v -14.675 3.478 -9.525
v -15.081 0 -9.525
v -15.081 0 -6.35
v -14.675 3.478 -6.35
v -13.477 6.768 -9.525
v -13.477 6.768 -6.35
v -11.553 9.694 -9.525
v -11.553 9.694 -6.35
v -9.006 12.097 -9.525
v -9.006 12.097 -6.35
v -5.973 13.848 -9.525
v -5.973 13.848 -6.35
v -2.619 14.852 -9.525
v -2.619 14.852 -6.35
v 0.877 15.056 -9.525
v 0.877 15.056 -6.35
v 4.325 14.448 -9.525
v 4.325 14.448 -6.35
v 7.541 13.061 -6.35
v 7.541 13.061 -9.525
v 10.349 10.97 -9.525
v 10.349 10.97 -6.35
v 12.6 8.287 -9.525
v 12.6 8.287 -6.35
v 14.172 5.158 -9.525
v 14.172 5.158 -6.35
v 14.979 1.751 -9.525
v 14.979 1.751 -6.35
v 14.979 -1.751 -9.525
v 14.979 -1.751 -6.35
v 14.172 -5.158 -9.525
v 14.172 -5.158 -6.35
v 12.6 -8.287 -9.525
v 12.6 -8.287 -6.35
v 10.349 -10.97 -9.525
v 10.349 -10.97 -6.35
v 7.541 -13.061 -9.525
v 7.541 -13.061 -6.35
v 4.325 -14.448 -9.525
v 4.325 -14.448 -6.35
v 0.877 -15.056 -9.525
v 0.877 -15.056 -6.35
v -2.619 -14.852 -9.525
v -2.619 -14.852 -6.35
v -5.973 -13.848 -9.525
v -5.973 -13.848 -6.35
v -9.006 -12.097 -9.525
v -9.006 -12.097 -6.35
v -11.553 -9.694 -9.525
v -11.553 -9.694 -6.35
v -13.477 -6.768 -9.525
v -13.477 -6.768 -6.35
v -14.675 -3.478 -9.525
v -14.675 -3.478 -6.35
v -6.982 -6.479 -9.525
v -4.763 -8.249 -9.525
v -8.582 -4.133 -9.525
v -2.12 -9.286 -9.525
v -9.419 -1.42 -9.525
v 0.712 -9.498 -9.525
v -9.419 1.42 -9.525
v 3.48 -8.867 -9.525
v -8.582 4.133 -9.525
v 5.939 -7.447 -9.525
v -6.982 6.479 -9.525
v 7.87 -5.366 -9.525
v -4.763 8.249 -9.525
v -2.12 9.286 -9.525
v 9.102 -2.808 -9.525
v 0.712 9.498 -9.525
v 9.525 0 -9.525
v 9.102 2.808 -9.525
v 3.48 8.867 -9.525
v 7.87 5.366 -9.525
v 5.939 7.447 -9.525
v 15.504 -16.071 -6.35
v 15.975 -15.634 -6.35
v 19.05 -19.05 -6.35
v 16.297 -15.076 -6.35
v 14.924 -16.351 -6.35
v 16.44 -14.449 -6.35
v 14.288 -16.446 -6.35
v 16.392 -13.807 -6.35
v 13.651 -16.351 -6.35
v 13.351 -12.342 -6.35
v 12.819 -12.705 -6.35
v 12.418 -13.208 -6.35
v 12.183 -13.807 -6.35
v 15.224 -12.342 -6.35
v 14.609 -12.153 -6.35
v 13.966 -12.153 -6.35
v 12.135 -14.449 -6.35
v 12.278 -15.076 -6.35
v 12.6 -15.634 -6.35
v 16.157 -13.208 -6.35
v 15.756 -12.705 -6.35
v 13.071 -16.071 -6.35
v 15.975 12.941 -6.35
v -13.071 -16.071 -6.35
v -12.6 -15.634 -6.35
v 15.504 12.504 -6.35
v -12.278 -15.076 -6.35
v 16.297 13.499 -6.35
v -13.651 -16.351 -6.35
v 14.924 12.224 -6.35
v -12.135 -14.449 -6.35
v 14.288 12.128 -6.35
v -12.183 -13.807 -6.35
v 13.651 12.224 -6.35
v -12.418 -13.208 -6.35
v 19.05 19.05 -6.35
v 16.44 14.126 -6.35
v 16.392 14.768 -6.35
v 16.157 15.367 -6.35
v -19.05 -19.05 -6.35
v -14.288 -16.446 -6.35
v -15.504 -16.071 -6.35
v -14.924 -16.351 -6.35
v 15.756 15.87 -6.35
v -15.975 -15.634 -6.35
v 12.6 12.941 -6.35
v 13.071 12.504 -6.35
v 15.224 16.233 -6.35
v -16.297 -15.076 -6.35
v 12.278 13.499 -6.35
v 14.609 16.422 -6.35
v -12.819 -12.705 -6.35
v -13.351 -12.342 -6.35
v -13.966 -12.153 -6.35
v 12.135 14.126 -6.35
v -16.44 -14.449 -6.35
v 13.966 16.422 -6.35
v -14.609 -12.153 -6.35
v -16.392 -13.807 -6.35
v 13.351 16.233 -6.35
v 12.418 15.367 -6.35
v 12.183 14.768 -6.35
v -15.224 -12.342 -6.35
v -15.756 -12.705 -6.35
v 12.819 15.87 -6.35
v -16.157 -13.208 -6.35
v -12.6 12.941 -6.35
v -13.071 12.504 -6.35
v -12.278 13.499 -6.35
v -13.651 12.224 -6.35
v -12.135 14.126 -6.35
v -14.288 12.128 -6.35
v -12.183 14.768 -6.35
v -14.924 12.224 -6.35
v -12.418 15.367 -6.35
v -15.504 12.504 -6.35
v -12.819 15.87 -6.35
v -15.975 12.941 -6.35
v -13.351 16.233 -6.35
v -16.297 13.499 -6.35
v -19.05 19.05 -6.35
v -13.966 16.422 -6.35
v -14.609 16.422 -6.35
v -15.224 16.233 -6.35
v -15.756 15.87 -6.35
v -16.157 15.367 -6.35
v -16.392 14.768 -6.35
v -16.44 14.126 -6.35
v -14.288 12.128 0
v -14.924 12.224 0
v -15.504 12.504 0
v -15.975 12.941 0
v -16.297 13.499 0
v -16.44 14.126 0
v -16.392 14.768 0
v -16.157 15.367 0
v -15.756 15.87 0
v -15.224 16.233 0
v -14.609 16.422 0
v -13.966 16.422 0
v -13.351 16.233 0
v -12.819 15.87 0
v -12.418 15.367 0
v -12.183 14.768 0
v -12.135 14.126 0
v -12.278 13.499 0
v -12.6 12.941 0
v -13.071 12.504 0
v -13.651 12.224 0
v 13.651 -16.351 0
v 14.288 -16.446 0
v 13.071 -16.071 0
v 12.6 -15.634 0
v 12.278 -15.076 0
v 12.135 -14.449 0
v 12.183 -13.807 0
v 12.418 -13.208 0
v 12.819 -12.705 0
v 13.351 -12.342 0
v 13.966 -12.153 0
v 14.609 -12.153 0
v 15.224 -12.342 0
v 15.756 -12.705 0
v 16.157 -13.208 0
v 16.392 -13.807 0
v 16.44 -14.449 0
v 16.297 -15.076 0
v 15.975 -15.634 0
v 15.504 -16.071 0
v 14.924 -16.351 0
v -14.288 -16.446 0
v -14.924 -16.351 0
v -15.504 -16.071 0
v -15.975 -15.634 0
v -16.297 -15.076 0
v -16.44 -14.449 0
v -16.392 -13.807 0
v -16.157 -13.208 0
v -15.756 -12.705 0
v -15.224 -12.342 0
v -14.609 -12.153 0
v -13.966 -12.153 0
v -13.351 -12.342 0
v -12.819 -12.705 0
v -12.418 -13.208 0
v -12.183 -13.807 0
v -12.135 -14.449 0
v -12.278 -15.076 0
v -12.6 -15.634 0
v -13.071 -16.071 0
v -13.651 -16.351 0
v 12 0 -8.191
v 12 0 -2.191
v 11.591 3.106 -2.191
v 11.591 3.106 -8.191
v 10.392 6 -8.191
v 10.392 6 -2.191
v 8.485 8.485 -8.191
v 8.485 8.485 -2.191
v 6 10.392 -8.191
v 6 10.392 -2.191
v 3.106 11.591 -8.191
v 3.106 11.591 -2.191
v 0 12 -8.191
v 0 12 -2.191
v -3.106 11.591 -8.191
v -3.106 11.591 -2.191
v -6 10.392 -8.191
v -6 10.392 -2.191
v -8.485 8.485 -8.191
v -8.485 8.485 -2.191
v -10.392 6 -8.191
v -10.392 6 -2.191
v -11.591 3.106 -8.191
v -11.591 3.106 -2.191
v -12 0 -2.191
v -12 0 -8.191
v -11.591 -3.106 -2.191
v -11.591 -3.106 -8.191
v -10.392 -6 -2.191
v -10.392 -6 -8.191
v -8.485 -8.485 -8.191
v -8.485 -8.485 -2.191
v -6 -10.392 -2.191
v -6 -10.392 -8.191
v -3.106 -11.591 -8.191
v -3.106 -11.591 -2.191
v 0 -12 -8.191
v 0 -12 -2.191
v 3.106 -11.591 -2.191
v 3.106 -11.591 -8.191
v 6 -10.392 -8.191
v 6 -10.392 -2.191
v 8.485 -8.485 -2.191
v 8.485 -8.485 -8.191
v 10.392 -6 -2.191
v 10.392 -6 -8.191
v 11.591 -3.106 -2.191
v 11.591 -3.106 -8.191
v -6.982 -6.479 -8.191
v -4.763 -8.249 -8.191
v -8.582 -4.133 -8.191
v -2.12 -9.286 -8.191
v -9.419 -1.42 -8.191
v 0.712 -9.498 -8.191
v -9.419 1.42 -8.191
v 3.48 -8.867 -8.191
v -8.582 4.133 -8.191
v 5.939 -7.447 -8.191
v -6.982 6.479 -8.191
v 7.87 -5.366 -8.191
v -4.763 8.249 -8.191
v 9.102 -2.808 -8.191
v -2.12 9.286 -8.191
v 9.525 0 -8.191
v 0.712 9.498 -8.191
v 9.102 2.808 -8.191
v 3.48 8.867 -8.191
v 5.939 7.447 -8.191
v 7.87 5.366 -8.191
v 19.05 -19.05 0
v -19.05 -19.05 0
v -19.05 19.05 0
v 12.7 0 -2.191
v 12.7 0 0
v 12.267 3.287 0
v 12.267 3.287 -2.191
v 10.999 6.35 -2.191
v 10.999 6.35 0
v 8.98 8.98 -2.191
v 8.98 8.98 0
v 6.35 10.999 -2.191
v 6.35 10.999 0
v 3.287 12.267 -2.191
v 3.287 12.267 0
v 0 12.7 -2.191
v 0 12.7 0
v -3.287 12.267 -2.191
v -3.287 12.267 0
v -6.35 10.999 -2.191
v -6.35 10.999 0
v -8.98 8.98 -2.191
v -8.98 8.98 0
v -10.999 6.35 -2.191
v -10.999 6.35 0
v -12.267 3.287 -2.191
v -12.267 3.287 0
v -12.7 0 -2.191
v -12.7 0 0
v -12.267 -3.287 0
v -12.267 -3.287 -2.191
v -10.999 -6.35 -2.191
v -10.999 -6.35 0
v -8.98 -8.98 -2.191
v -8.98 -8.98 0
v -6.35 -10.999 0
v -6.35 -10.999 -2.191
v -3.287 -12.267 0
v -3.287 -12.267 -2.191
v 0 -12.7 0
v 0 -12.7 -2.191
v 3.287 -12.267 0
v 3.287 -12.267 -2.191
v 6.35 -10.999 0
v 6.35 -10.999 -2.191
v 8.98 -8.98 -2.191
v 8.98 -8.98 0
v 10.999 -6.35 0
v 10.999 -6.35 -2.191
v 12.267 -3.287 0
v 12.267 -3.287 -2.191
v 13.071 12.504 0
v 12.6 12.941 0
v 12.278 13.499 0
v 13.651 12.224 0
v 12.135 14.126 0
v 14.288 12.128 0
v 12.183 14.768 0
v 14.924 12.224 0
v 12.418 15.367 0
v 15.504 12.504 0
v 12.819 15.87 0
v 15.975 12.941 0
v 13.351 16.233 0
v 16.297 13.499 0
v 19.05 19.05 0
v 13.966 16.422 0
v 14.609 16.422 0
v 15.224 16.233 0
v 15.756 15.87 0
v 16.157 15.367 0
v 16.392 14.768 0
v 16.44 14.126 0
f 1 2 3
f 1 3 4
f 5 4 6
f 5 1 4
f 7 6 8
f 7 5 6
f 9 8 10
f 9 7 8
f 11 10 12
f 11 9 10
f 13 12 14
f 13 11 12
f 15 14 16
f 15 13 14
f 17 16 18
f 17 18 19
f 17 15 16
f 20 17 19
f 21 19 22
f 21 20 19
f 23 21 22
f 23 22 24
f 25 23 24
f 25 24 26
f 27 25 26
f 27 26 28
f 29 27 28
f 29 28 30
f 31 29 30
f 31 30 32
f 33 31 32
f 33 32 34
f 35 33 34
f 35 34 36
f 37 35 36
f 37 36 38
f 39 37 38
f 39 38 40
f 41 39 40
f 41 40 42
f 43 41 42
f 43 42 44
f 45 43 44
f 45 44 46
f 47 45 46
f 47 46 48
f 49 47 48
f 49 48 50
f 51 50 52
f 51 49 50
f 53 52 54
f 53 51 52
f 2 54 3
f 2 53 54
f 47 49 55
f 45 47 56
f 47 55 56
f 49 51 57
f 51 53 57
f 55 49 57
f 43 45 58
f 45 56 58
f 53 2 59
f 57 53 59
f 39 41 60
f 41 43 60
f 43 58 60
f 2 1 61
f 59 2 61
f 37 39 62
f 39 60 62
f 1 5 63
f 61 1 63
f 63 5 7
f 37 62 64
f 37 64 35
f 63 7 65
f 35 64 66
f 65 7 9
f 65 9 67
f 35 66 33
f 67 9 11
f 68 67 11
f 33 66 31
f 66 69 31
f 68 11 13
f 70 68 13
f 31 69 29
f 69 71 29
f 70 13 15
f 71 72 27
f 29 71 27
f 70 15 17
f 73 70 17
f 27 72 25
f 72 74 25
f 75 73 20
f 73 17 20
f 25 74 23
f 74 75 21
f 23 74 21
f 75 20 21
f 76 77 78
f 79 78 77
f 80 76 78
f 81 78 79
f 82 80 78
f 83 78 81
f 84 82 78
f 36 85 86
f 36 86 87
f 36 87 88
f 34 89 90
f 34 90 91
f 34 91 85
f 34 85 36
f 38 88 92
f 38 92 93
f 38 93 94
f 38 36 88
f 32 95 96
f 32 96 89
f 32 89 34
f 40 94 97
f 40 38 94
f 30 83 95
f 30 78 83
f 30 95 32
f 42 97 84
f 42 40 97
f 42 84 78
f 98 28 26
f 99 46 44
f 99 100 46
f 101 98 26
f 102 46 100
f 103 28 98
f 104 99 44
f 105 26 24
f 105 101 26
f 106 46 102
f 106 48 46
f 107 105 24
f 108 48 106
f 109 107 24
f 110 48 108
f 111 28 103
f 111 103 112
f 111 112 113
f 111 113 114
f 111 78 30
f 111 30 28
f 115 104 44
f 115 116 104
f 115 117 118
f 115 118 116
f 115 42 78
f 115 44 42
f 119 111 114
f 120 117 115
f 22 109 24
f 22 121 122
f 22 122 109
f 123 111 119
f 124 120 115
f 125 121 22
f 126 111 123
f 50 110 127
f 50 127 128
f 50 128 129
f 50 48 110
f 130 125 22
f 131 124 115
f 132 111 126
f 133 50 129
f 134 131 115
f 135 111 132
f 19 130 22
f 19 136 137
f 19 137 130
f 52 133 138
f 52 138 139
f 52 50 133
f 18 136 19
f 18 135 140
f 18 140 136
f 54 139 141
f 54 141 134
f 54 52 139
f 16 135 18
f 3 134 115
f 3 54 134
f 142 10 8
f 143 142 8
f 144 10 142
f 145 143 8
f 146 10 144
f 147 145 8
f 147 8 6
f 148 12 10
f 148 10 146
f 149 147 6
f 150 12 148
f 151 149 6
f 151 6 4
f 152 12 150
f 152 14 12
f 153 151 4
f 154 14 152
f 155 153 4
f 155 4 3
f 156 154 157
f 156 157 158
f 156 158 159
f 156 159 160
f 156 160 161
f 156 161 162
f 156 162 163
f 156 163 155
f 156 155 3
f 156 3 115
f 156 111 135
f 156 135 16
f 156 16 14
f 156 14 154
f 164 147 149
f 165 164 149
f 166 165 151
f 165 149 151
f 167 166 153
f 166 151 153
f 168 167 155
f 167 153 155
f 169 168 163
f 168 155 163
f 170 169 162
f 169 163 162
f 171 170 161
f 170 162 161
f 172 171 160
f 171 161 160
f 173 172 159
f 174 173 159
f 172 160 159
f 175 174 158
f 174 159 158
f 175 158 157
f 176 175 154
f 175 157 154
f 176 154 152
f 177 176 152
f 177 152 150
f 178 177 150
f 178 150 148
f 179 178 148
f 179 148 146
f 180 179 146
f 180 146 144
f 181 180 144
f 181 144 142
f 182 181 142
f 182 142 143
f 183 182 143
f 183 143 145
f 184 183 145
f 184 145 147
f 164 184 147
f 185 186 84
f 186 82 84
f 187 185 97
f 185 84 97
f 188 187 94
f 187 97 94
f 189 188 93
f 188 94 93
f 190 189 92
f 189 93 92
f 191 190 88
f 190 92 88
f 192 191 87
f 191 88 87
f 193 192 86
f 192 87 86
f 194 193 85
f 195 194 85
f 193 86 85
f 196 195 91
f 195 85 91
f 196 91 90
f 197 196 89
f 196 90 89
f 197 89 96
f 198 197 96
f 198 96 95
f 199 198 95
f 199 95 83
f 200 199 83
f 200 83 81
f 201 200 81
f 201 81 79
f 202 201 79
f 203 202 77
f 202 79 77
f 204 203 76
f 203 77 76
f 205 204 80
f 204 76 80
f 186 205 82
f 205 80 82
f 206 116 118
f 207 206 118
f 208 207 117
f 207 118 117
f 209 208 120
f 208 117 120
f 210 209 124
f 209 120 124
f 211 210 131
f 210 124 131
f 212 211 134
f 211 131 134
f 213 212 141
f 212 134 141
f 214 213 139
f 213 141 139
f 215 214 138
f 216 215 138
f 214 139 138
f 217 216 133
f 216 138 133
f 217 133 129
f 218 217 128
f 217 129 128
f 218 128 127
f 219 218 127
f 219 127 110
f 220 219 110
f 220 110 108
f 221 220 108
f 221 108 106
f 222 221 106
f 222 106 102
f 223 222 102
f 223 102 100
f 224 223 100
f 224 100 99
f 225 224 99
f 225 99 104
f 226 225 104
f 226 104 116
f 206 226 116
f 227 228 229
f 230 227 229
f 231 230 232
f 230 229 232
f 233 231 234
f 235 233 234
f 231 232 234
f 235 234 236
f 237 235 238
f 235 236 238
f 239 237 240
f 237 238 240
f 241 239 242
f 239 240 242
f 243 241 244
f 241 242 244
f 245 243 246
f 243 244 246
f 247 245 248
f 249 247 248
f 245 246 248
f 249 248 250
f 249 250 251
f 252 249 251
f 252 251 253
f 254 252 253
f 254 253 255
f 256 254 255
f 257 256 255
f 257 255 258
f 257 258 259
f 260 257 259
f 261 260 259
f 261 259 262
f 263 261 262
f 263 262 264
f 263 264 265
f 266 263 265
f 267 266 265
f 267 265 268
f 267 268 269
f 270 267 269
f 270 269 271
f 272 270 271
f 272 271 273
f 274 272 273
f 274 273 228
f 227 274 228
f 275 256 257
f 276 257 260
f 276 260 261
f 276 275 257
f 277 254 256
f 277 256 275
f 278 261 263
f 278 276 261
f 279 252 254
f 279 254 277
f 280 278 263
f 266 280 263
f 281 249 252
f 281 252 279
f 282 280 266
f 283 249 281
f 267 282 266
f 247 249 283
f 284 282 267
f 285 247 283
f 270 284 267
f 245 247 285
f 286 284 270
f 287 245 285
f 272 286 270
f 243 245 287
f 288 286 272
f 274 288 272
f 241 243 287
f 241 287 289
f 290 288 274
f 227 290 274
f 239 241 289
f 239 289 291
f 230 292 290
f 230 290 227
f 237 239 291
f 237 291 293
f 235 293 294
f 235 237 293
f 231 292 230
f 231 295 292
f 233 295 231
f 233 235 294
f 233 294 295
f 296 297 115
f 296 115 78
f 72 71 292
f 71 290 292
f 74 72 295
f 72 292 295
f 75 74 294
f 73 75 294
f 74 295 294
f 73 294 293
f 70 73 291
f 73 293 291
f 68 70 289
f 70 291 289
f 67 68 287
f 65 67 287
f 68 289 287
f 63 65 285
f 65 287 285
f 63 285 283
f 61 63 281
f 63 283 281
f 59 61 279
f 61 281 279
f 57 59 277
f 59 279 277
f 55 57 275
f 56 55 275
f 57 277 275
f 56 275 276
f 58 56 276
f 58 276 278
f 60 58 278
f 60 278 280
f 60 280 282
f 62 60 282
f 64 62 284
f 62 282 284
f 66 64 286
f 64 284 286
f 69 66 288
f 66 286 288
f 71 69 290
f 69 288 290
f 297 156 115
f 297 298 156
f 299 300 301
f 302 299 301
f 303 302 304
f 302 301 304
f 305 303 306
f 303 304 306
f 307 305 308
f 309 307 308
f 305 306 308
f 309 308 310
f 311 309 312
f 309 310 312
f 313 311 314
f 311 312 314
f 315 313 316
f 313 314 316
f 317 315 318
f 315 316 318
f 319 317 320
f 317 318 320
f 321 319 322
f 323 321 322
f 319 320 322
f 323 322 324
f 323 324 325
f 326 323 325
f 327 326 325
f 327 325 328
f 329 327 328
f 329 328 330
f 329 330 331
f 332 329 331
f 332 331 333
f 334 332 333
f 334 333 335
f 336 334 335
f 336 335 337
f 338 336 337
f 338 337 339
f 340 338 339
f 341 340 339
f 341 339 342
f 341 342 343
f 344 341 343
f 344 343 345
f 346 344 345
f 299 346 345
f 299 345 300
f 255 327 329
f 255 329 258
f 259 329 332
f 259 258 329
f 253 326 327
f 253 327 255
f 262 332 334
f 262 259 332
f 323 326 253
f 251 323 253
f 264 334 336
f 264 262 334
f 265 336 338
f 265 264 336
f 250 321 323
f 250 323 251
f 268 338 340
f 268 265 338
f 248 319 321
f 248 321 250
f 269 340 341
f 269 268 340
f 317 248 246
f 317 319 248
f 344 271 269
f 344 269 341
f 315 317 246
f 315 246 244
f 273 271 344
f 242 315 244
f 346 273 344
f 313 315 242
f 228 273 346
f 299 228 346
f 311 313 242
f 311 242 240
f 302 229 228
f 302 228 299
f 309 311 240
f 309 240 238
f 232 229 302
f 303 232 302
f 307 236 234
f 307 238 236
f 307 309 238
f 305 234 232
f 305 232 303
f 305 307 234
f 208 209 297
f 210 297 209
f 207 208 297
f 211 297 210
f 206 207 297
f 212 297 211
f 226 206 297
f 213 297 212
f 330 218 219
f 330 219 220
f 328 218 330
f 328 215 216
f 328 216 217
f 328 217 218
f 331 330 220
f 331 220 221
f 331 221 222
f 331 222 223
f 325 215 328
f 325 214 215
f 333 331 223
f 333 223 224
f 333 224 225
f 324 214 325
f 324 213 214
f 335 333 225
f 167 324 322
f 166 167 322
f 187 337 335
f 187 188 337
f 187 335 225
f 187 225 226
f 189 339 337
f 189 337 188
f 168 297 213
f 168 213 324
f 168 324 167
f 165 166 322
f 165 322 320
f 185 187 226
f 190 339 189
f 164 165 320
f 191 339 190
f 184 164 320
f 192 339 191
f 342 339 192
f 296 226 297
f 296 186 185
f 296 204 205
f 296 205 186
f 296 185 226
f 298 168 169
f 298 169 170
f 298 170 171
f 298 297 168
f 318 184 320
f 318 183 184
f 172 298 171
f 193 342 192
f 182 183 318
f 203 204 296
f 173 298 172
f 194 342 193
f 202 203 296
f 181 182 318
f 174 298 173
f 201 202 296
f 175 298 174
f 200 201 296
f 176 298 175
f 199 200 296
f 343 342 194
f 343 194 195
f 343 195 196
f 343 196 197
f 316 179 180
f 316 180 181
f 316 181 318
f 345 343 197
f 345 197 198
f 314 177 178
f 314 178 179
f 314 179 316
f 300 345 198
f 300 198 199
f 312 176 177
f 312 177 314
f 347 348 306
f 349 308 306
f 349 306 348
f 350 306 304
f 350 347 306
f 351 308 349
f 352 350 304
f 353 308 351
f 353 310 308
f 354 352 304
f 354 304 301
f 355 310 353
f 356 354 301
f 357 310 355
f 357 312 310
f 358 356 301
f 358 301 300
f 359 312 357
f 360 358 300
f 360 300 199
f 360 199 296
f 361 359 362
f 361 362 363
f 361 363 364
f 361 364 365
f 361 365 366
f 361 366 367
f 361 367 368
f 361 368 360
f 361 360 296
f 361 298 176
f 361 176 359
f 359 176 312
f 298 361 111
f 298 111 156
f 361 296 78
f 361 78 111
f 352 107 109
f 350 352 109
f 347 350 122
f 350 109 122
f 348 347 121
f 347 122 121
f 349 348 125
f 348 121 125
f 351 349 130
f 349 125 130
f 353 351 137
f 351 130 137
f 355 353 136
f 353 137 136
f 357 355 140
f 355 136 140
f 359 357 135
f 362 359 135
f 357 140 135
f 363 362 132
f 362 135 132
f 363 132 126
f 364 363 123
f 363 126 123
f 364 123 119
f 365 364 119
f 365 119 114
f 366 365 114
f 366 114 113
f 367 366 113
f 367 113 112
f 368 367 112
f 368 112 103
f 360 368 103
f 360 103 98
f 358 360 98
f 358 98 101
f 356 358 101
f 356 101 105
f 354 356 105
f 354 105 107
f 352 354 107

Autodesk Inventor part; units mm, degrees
ref_plane "YZ Plane" through (0, 0, 0) normal (1, 0, 0) x (0, 1, 0)
ref_plane "XZ Plane" through (0, 0, 0) normal (0, 1, 0) x (-1, 0, 0)
ref_plane "XY Plane" through (0, 0, 0) normal (0, 0, 1) x (1, 0, 0)
sketch "Sketch1" plane through (0, 0, 0) normal (0, 0, 1) x (1, 0, 0)
  line L0 (-19.05, -19.05) -> (19.05, -19.05)
  line L1 (19.05, -19.05) -> (19.05, 19.05)
  line L2 (19.05, 19.05) -> (-19.05, 19.05)
  line L3 (-19.05, 19.05) -> (-19.05, -19.05)
  line L4 (-19.05, -19.05) -> (19.05, 19.05) construction
  line L5 (19.05, -19.05) -> (-19.05, 19.05) construction
  line L6 (14.2875, -14.2875) -> (-14.2875, -14.2875) construction
  line L7 (-14.2875, -14.2875) -> (-14.2875, 14.2875) construction
  line L8 (-14.2875, 14.2875) -> (14.2875, 14.2875) construction
  line L9 (14.2875, 14.2875) -> (14.2875, -14.2875) construction
  line L10 (14.2875, -14.2875) -> (-14.2875, 14.2875) construction
  line L11 (-14.2875, -14.2875) -> (14.2875, 14.2875) construction
  circle A0 centre (0, 0) radius 12.7
  circle A1 centre (0, 0) radius 12
  circle A2 centre (0, 0) radius 9.525
  dimension "d0" = 38.1
  dimension "d1" = 38.1
  dimension "d3" = 25.4
  dimension "d4" = 24
  dimension "d5" = 19.05
  dimension "d20" = 28.575
extrude "Extrusion1" add sketch "Sketch1" against normal blind 9.525 contours L3 L2 L1 L0 | A0 | A1
extrude "Extrusion2" cut sketch "Sketch1" against normal blind 2.1906 contours A0
extrude "Extrusion3" cut sketch "Sketch1" against normal blind 8.1906 contours A1
hole "Hole1" at (-14.2875, 14.2875, 0) at (14.2875, 14.2875, 0) at (14.2875, -14.2875, 0) at (-14.2875, -14.2875, 0) direction (0, 0, -1) diameter 4.318 end through all clearance for "Socket Head Cap Screw" size "#8" standard "Ansi Unified Screw Threads"
sketch "Sketch2" plane through (0, 0, -9.525) normal (0, 0, -1) x (-1, 0, 0)
  line L0 (-19.05, -19.05) -> (19.05, -19.05) projected
  line L1 (19.05, -19.05) -> (19.05, 19.05) projected
  line L2 (19.05, 19.05) -> (-19.05, 19.05) projected
  line L3 (-19.05, 19.05) -> (-19.05, -19.05) projected
  circle A0 centre (-14.2875, -14.2875) radius 2.159 projected
  circle A1 centre (14.2875, 14.2875) radius 2.159 projected
  circle A2 centre (-14.2875, 14.2875) radius 2.159 projected
  circle A3 centre (14.2875, -14.2875) radius 2.159 projected
  circle A4 centre (0, 0) radius 9.525 projected
  circle A5 centre (-14.2875, 14.2875) radius 3.429 construction
  circle A6 centre (0, 0) radius 12 construction
  circle A7 centre (0, 0) radius 15.0812
  dimension "d21" = 6.858
  dimension "d22" = 24
  dimension "d23" = 30.1625
extrude "Extrusion4" cut sketch "Sketch2" against normal blind 3.175 contours L3 L2 L1 L0
equation "\"d1\" = d0"
properties part number "Module Top Cap"
